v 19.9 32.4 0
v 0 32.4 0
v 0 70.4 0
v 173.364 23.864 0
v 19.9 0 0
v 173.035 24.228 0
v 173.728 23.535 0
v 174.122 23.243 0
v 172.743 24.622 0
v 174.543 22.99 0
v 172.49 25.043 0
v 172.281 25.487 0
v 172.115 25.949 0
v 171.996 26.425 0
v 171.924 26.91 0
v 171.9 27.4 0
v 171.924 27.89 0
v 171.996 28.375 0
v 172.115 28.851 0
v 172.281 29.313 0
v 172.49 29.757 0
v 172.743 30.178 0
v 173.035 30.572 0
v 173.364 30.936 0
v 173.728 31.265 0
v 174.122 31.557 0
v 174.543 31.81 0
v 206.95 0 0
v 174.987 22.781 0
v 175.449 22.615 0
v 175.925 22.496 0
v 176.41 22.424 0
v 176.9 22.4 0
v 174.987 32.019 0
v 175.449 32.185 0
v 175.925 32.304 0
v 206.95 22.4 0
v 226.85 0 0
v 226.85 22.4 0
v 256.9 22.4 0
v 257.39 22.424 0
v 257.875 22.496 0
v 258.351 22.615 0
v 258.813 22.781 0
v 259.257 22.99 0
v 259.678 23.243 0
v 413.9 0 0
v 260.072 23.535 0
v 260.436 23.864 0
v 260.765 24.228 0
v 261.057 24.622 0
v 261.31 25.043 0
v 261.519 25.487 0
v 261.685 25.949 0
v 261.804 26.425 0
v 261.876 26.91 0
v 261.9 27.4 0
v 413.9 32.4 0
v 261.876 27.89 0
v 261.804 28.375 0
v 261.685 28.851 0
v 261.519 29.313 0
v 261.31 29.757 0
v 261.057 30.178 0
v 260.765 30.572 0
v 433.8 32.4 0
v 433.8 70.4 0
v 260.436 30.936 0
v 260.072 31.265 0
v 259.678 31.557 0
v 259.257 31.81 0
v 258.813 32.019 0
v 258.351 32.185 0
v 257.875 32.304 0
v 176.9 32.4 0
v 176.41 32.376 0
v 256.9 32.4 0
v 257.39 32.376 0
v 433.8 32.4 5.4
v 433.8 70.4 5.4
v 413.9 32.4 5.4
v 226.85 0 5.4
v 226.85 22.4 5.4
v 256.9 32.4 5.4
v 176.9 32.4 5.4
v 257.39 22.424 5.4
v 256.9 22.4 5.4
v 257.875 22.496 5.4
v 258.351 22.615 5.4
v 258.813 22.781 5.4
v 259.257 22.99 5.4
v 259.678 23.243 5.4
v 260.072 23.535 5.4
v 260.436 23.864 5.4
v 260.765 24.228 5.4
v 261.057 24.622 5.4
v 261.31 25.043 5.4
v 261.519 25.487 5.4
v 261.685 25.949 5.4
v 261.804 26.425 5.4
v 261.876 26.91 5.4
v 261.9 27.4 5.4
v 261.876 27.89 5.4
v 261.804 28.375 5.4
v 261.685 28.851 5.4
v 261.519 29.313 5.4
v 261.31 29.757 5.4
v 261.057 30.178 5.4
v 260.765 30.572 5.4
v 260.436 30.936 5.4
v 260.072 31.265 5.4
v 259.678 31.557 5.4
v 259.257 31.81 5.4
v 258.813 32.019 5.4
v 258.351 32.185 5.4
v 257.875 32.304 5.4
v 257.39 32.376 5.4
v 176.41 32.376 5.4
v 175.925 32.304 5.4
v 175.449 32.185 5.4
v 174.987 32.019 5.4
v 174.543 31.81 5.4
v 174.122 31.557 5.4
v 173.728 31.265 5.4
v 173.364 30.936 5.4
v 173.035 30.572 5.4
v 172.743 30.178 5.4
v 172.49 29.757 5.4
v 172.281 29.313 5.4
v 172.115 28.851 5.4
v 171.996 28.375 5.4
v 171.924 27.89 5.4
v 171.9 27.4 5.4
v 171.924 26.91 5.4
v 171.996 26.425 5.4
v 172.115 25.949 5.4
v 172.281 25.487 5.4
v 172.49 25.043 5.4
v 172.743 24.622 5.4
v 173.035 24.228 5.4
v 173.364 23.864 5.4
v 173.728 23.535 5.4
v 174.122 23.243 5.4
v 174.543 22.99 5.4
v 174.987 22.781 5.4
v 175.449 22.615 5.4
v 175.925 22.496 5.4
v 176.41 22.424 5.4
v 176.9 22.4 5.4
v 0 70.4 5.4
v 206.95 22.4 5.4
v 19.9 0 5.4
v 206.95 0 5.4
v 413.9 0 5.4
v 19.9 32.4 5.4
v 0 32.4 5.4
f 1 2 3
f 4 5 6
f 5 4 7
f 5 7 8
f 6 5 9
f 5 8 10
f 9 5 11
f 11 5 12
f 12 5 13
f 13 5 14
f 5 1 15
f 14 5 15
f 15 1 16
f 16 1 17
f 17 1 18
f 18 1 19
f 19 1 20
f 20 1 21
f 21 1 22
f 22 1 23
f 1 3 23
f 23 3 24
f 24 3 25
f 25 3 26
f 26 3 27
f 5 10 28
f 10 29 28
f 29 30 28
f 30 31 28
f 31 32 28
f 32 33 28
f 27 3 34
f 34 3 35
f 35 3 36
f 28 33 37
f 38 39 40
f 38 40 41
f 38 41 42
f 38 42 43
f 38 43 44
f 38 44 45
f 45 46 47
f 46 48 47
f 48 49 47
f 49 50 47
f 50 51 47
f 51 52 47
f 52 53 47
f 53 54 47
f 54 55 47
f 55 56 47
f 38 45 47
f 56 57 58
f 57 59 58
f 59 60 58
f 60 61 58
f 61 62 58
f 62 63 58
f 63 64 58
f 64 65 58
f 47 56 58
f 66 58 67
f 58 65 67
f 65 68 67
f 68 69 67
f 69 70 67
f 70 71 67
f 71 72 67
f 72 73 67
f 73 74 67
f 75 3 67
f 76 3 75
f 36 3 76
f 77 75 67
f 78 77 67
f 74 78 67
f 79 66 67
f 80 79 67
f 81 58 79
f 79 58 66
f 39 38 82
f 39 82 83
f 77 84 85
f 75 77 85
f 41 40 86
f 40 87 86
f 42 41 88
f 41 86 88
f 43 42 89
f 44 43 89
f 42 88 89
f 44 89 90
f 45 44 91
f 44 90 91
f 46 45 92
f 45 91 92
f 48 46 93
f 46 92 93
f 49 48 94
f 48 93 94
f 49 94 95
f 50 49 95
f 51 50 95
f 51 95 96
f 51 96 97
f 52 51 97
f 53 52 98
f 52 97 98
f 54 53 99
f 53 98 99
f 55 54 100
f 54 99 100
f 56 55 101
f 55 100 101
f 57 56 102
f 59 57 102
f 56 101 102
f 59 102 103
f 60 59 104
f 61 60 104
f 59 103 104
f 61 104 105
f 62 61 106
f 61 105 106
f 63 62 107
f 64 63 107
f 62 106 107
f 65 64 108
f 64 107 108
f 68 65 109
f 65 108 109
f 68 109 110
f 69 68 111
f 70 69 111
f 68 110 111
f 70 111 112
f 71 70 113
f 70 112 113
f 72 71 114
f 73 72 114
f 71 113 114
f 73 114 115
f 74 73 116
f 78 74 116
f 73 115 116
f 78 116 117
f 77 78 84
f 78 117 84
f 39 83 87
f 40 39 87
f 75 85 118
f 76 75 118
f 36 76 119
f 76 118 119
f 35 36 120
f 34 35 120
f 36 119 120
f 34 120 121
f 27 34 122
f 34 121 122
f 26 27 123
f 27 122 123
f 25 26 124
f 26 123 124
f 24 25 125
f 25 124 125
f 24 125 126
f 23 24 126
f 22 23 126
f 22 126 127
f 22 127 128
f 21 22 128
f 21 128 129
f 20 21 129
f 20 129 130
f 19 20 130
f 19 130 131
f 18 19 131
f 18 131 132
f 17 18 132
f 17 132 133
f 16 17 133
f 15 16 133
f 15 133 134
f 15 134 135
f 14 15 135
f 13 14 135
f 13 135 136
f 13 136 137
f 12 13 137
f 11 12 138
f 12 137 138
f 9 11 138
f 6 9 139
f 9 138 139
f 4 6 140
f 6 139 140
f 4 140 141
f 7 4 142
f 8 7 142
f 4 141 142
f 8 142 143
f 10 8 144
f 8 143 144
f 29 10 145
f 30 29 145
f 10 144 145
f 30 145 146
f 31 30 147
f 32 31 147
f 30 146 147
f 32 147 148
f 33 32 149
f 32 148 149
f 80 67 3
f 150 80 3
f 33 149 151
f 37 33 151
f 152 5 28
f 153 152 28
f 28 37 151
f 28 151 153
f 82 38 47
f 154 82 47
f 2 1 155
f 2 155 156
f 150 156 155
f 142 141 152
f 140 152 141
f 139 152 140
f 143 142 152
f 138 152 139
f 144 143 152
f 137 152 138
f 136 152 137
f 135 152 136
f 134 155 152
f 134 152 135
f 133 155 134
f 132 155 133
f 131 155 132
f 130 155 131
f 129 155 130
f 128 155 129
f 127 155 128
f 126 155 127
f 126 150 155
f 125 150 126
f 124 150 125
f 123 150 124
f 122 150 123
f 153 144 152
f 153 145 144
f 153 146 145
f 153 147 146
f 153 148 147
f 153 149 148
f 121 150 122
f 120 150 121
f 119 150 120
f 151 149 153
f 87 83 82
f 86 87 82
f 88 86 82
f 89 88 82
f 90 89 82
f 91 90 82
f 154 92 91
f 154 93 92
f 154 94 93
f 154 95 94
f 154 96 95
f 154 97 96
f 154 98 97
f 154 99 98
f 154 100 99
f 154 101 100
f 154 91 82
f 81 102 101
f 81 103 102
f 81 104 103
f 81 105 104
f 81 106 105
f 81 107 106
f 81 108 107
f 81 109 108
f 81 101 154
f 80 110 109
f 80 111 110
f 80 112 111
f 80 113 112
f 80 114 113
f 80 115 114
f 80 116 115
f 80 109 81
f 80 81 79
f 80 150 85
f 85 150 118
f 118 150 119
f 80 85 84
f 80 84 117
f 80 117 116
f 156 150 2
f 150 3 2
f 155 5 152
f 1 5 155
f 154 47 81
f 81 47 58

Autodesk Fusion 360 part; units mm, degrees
sketch "Sketch1" plane through (0, 0, 0) normal (0, 0, 1) x (1, 0, 0)
  line L0 (0, 0) -> (433.8, 0)
  line L1 (433.8, 0) -> (433.8, 70.4)
  line L2 (433.8, 70.4) -> (0, 70.4)
  line L3 (0, 70.4) -> (0, 0)
  line L4 (0, 0) -> (19.9, 0)
  line L5 (19.9, 0) -> (19.9, 32.4)
  line L6 (19.9, 32.4) -> (0, 32.4)
  line L7 (0, 32.4) -> (0, 0)
  line L8 (206.95, 0) -> (226.85, 0)
  line L9 (226.85, 0) -> (226.85, 32.4)
  line L10 (226.85, 32.4) -> (206.95, 32.4)
  line L11 (206.95, 32.4) -> (206.95, 0)
  line L12 (433.8, 0) -> (413.9, 0)
  line L13 (413.9, 0) -> (413.9, 32.4)
  line L14 (413.9, 32.4) -> (433.8, 32.4)
  line L15 (433.8, 32.4) -> (433.8, 0)
  dimension "d1" = 433.8
  dimension "d2" = 70.4
  dimension "d3" = 19.9
  dimension "d4" = 19.9
  dimension "d5" = 19.9
  dimension "d6" = 32.4
  dimension "d7" = 32.4
  dimension "d8" = 32.4
  dimension "d9" = 206.95
extrude "Extrude2" add sketch "Sketch1" along normal blind 5.4 contours L0 L1 L2 L3 L5 L6 L9 L10 L11 L13 L14
sketch "Sketch2" plane through (0, 0, 5.4) normal (0, 0, 1) x (1, 0, 0)
  line L0 (226.85, 0) -> (413.9, 0)
  line L1 (413.9, 0) -> (413.9, 32.4)
  line L2 (413.9, 32.4) -> (433.8, 32.4)
  line L3 (433.8, 32.4) -> (433.8, 70.4)
  line L4 (433.8, 70.4) -> (0, 70.4)
  line L5 (0, 70.4) -> (0, 32.4)
  line L6 (0, 32.4) -> (19.9, 32.4)
  line L7 (19.9, 32.4) -> (19.9, 0)
  line L8 (19.9, 0) -> (206.95, 0)
  line L9 (206.95, 0) -> (206.95, 32.4)
  line L10 (206.95, 32.4) -> (226.85, 32.4)
  line L11 (226.85, 32.4) -> (226.85, 0)
  line L12 (256.9, 32.4) -> (176.9, 32.4)
  arc A0 (176.9, 32.4) -> (176.9, 22.4) centre (176.9, 27.4) ccw
  line L13 (176.9, 22.4) -> (256.9, 22.4)
  arc A1 (256.9, 22.4) -> (256.9, 32.4) centre (256.9, 27.4) ccw
  line L14 (256.9, 27.4) -> (176.9, 27.4) construction
  point P0 (216.9, 27.4)
  dimension "d14" = 5
  dimension "d15" = 80
  dimension "d16" = 433.8
  dimension "d17" = 216.9
extrude "Extrude3" cut sketch "Sketch2" against normal blind 25 contours L11 L12 L13 A1 | L9 L12 A0 L13
sketch "export" plane through (0, 0, 5.4) normal (0, 0, 1) x (1, 0, 0)
  line L0 (206.95, 22.4) -> (176.9, 22.4)
  arc A0 (176.9, 32.4) -> (176.9, 22.4) centre (176.9, 27.4) ccw
  line L1 (176.9, 32.4) -> (256.9, 32.4)
  arc A1 (256.9, 22.4) -> (256.9, 32.4) centre (256.9, 27.4) ccw
  line L2 (256.9, 22.4) -> (226.85, 22.4)
  line L3 (226.85, 22.4) -> (226.85, 0)
  line L4 (226.85, 0) -> (413.9, 0)
  line L5 (413.9, 0) -> (413.9, 32.4)
  line L6 (413.9, 32.4) -> (433.8, 32.4)
  line L7 (433.8, 32.4) -> (433.8, 70.4)
  line L8 (433.8, 70.4) -> (0, 70.4)
  line L9 (0, 70.4) -> (0, 32.4)
  line L10 (0, 32.4) -> (19.9, 32.4)
  line L11 (19.9, 32.4) -> (19.9, 0)
  line L12 (19.9, 0) -> (206.95, 0)
  line L13 (206.95, 0) -> (206.95, 22.4)
extrude "Extrude1" [suppressed]
equation "d2 = d6 + 38 mm"
equation "d4 = d3"
equation "d5 = d4"
equation "d6 = 6 * 5.4 mm"
equation "d7 = d6"
equation "d8 = d7"
equation "d9 = ( d1 - d4 ) / 2"
equation "d17 = d16 / 2"
